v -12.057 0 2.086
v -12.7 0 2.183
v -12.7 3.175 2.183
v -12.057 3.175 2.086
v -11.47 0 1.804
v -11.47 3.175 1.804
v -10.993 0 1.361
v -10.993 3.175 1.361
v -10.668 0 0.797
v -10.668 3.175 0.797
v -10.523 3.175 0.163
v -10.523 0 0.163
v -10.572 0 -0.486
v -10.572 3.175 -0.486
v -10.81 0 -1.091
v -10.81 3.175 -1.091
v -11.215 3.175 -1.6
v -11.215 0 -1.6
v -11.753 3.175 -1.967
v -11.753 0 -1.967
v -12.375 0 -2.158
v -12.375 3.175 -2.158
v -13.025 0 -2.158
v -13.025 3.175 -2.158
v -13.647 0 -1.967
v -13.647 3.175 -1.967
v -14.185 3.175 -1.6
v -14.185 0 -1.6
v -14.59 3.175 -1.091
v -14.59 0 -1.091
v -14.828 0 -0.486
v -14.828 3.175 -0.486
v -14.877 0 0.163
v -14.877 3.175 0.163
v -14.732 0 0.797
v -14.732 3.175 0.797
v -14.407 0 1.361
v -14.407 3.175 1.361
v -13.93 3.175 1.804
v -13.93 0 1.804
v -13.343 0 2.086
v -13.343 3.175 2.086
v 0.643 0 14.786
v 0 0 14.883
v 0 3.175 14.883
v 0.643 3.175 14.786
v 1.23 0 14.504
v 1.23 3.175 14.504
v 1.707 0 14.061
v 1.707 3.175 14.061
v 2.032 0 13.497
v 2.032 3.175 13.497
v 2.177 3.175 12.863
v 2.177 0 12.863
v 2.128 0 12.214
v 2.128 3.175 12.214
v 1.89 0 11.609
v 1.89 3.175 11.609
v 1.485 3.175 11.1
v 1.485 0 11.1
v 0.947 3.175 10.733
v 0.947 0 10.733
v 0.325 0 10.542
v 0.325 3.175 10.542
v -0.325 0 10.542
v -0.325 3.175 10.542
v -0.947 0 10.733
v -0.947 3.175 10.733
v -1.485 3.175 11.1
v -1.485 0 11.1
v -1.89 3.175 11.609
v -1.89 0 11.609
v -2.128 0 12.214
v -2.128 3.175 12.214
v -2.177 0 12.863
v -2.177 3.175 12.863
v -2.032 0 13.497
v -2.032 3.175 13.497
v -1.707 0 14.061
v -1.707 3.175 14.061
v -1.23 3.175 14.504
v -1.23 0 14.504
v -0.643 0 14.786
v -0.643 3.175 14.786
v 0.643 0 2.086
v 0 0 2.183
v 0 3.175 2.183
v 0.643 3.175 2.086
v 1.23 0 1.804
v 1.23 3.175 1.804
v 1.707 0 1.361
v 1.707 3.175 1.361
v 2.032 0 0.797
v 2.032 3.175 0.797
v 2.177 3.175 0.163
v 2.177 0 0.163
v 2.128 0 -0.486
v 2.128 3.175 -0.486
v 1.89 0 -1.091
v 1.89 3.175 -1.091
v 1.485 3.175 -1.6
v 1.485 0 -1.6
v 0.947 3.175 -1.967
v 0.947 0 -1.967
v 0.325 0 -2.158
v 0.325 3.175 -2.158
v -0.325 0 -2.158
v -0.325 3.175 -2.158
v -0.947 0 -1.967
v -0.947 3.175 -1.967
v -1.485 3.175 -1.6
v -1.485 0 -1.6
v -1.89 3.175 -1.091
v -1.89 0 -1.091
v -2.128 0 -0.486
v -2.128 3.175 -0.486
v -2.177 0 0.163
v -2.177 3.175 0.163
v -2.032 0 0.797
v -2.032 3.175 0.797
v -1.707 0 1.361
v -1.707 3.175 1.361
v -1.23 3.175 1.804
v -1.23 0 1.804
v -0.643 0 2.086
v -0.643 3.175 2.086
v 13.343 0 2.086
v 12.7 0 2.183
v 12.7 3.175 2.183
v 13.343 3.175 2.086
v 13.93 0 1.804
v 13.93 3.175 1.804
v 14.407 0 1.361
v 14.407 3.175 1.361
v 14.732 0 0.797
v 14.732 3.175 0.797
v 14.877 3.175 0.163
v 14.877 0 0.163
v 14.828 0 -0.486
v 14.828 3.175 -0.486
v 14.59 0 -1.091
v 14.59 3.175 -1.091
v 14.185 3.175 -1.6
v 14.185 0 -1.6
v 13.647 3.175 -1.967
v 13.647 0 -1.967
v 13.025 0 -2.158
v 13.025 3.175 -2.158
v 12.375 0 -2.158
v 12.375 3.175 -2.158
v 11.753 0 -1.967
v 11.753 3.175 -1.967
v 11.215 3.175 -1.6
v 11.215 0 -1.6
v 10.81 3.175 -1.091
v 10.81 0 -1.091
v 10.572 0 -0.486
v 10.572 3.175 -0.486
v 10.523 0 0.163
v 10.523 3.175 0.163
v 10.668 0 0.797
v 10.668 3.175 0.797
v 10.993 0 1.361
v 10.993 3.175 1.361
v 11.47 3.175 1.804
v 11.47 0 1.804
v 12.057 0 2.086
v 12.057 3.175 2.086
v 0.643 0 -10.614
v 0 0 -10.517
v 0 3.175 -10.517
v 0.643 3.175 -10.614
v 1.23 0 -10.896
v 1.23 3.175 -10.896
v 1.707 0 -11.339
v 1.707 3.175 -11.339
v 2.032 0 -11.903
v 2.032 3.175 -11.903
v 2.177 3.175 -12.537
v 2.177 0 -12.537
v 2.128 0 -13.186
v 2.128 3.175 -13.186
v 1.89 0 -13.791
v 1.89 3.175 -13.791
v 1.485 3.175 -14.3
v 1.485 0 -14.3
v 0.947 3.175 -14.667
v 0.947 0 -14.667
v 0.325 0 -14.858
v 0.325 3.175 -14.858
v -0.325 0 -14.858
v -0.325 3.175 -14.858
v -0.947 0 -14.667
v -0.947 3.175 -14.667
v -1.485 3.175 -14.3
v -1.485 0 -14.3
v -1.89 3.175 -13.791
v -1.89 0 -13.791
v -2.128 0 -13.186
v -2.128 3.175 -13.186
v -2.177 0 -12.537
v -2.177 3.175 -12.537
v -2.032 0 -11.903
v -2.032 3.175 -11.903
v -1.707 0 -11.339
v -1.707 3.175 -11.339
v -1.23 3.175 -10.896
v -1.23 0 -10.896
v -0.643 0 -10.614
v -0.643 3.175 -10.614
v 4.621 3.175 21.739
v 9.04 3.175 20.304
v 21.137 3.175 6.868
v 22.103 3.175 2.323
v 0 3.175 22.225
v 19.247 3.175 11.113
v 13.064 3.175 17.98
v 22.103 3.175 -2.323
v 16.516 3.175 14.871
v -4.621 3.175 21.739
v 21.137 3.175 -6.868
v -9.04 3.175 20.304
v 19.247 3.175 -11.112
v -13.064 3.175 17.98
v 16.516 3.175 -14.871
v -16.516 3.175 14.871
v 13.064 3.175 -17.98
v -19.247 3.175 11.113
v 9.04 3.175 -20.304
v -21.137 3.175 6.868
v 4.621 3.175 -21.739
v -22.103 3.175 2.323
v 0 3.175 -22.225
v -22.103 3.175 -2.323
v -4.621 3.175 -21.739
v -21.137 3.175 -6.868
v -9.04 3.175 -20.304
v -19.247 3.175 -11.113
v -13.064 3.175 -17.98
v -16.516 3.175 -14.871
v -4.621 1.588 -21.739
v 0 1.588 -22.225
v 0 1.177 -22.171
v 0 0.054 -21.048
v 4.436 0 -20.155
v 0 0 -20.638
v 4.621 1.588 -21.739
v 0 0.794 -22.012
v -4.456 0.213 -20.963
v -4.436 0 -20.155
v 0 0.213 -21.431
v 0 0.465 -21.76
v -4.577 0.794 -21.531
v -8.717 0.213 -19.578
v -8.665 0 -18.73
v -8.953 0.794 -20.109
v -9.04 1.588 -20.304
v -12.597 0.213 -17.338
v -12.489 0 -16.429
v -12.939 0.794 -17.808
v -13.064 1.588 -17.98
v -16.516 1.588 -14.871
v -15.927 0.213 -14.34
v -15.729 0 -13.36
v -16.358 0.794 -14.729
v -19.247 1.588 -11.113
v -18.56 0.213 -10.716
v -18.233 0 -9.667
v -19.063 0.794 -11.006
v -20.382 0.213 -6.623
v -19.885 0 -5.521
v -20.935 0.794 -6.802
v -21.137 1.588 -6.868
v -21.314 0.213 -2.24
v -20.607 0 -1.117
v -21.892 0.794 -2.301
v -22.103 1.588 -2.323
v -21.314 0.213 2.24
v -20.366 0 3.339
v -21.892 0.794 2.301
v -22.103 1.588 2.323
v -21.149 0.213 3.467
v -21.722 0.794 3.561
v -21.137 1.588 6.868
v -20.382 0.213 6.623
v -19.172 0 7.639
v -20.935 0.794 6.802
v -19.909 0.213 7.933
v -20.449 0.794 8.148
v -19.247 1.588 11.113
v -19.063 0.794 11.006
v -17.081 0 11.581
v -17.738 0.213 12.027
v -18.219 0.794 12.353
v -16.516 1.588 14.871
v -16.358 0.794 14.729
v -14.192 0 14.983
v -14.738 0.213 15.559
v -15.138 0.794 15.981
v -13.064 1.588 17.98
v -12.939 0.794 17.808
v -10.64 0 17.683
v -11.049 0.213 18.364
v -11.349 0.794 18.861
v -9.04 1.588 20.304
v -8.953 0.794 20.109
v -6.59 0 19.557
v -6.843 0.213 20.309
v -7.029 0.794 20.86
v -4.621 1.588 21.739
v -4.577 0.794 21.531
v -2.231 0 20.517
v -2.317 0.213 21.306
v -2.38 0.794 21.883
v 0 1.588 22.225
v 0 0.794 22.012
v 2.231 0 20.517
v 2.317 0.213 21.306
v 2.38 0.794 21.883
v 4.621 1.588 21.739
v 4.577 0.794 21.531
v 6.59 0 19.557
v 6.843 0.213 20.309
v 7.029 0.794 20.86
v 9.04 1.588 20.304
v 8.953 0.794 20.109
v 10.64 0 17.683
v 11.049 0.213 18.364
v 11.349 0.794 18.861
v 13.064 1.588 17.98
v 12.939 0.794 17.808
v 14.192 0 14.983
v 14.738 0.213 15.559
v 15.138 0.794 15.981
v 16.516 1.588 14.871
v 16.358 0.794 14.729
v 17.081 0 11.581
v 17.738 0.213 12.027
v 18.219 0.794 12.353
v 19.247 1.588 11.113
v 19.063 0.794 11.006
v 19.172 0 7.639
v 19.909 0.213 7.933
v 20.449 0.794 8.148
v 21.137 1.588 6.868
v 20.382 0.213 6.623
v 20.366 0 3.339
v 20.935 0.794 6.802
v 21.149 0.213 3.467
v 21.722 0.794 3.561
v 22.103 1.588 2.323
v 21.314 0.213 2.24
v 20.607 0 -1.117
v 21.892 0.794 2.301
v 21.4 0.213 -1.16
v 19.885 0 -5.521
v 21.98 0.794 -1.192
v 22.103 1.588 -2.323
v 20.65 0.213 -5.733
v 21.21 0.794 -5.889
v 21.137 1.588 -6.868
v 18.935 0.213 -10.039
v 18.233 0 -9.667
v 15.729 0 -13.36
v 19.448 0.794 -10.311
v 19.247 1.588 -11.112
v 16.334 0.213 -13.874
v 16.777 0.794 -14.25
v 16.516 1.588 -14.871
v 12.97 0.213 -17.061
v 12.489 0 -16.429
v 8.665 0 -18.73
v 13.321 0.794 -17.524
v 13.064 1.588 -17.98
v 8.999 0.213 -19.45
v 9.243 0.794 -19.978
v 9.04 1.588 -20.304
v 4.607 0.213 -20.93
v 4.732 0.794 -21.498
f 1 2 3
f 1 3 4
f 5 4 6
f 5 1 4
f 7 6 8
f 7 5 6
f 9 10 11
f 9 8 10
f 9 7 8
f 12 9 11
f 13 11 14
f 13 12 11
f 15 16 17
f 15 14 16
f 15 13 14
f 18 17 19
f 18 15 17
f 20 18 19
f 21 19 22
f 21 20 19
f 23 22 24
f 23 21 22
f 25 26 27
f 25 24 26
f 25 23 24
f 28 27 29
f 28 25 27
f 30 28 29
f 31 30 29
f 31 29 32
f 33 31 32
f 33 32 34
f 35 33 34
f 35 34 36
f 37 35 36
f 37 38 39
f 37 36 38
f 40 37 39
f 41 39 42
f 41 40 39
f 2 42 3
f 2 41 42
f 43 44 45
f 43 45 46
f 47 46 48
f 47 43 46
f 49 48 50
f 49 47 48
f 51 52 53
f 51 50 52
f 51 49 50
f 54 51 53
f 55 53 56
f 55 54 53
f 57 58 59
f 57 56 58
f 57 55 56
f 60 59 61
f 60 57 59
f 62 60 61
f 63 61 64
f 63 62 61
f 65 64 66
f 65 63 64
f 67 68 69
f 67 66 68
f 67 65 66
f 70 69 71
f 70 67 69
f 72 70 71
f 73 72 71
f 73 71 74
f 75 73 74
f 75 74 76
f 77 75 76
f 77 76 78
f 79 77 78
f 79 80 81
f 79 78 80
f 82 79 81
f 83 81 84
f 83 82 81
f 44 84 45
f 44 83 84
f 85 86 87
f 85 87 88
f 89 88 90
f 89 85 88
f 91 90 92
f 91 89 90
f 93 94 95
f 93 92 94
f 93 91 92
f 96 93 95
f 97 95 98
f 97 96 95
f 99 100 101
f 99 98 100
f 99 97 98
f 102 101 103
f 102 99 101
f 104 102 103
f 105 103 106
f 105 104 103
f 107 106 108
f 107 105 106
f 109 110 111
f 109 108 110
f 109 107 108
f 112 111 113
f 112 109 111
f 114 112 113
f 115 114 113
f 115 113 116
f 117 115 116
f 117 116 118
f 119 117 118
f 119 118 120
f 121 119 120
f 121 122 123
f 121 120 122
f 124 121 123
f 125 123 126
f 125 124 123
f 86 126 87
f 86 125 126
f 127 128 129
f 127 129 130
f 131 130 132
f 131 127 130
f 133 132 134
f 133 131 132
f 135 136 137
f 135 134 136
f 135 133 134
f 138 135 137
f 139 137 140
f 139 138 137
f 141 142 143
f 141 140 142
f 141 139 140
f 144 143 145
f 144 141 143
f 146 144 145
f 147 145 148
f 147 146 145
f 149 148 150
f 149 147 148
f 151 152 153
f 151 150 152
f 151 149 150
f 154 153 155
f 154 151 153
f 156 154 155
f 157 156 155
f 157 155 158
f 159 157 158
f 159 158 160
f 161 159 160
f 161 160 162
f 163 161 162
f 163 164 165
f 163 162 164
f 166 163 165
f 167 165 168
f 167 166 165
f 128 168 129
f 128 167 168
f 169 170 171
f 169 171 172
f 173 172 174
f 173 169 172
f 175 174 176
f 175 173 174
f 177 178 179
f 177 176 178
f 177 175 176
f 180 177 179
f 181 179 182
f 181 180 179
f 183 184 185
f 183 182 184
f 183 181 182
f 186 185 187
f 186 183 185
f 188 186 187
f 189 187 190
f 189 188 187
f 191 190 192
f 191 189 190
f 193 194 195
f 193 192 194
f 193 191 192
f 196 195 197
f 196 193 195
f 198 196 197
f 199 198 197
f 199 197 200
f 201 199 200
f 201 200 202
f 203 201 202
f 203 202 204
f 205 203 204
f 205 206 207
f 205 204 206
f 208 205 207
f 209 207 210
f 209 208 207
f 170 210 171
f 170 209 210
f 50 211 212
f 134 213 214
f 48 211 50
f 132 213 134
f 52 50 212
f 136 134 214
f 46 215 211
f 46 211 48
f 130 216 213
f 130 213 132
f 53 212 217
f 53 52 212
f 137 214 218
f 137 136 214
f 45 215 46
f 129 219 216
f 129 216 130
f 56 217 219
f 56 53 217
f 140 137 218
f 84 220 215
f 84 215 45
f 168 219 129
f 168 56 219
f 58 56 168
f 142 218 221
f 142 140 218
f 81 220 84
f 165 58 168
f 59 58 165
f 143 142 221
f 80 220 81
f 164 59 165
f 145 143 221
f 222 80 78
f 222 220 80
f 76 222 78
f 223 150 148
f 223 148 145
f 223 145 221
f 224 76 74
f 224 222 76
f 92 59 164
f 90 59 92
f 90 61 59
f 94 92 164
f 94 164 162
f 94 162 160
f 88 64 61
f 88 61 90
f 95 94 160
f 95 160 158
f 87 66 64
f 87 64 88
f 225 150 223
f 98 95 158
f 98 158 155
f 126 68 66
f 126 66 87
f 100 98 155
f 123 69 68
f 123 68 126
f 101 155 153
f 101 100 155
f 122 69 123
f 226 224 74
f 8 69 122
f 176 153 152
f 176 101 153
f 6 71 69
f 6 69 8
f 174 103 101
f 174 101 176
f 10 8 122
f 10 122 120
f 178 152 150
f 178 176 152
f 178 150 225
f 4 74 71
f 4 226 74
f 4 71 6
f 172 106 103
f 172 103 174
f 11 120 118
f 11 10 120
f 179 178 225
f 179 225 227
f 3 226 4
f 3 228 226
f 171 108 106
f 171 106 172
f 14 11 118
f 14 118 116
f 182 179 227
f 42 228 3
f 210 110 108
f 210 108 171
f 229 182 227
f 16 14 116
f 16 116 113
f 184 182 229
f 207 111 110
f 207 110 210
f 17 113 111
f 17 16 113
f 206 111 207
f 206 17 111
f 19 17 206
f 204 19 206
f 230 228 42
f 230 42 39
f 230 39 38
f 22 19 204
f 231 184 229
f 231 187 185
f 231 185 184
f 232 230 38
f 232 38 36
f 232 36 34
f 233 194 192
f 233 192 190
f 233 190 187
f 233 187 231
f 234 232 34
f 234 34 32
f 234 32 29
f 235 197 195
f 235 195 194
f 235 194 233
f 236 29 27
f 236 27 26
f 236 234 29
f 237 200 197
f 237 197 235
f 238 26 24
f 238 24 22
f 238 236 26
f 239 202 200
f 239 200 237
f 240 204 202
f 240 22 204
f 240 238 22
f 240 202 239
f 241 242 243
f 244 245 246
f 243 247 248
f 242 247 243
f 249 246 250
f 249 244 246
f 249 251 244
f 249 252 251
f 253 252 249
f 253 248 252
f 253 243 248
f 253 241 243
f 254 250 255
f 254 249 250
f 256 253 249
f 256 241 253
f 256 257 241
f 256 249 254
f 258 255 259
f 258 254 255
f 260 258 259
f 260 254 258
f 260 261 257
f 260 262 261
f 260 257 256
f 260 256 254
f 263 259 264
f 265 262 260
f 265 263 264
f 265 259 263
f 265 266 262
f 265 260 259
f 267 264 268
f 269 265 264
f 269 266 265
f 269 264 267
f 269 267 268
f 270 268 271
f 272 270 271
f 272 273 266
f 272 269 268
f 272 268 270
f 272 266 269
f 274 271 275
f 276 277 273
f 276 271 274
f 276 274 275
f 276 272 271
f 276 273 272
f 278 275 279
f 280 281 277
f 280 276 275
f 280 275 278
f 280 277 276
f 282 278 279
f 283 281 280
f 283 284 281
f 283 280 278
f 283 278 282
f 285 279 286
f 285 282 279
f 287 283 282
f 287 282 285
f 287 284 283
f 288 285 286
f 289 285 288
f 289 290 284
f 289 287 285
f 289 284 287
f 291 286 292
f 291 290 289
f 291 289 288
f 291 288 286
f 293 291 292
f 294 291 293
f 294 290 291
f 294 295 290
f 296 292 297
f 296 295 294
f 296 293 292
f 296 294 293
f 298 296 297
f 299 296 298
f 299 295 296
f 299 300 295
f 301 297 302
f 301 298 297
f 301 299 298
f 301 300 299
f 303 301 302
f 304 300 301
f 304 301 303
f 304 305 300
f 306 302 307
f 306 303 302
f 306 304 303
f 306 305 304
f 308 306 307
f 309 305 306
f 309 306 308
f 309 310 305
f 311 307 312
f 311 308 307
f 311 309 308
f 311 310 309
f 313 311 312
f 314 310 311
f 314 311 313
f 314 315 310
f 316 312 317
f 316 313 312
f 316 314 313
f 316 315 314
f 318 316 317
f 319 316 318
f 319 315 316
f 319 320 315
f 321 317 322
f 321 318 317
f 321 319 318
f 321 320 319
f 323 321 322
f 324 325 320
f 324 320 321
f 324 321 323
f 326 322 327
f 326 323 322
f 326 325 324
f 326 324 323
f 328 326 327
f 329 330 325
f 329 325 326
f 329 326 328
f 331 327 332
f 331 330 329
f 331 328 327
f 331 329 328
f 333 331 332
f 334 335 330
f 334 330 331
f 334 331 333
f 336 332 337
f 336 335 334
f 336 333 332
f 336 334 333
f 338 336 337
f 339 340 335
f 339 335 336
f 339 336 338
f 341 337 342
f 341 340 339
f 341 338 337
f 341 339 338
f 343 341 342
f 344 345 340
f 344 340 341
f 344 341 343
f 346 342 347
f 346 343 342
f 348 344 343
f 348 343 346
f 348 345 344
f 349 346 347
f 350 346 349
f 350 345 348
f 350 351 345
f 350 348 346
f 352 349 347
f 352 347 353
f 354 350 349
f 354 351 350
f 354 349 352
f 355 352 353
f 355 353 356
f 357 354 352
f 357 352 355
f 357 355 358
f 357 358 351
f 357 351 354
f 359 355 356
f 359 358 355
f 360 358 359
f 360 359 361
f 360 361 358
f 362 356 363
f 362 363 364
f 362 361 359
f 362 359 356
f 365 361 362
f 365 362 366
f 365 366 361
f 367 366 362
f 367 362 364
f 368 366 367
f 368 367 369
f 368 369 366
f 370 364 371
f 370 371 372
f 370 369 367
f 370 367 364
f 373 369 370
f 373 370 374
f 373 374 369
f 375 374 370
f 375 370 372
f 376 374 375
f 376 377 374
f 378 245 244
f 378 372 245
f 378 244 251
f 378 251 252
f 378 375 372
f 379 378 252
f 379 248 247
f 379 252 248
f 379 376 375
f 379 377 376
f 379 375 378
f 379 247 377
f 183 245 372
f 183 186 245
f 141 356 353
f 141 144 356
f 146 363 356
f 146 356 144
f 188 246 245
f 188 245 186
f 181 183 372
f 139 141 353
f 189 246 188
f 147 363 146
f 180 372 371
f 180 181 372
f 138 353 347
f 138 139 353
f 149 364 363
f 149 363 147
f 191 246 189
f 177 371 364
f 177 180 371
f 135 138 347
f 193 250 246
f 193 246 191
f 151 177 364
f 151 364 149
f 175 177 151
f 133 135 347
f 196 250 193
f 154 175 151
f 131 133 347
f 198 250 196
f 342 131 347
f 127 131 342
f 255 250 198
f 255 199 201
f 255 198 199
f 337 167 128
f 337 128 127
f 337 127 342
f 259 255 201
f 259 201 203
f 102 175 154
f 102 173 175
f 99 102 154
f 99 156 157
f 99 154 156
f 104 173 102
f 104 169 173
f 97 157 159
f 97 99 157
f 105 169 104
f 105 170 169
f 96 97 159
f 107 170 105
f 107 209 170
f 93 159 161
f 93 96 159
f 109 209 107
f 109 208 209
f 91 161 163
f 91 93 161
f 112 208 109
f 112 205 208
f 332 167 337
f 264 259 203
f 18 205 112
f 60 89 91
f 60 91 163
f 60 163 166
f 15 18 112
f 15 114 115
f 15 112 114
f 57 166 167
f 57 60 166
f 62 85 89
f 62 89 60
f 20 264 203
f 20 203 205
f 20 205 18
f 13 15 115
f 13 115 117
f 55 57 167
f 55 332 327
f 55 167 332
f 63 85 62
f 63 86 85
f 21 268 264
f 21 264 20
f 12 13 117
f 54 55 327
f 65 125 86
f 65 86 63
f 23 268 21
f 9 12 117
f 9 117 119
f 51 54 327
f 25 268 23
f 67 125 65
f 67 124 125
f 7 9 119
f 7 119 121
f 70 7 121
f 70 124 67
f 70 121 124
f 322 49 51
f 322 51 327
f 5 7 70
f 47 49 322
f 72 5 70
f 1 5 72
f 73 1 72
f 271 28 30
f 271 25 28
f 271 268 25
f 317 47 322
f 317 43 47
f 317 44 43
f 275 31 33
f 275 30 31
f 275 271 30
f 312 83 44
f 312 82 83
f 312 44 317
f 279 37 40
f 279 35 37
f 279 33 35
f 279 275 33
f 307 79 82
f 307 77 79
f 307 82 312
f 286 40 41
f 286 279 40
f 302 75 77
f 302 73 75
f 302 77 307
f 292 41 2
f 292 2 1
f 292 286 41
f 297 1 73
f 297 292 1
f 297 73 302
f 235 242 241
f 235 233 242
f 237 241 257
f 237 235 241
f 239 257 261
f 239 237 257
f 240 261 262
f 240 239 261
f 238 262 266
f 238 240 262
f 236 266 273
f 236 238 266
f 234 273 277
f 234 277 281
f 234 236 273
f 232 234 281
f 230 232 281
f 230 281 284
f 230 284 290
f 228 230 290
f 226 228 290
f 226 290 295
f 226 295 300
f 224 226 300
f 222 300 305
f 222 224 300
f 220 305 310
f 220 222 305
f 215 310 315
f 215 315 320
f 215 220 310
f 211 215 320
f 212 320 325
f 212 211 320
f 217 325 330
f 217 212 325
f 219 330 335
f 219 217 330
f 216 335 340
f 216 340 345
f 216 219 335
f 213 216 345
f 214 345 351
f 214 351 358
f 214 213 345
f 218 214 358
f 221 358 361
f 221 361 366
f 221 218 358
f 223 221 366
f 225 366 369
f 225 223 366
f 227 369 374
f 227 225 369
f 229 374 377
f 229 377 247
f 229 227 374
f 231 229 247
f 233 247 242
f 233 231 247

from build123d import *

# Parameters (mm, degrees)
CUT_EXTRUDE1_DEPTH      = 32.590851198
CUT_EXTRUDE1_DEPTH_BACK = 32.590851198
SKETCH2_R               = 2.1828125


with BuildPart() as part:
    # Sketch1 → Revolve1 (revolve)
    with BuildSketch(Plane.XY, mode=Mode.PRIVATE) as revolve1_sk:
        with BuildLine():
            Line((0, 0), (20.6375, 0))
            ThreePointArc((20.6375, 0), (21.760032015, 0.464967985), (22.225, 1.5875))
            Line((22.225, 1.5875), (22.225, 3.175))
            Line((22.225, 3.175), (0, 3.175))
            Line((0, 3.175), (0, 0))
        make_face()
    revolve(revolve1_sk.sketch.rotate(Axis((0, 0, 0), (0, 1, 0)), 90), axis=Axis((0, 0, 0), (0, 1, 0)))

    # Sketch2 → Cut-Extrude1 (cut, two sides: drawn at the far end of the back side and taken through both)
    with BuildSketch(Plane(origin=(0, 3.175, 0), x_dir=(1, 0, 0), z_dir=(0, 1, 0)).offset(-CUT_EXTRUDE1_DEPTH_BACK)):
        with Locations(Location((0, 0, 0), (0, 0, 270))):
            Circle(SKETCH2_R)
        with Locations(Location((12.7, 0, 0), (0, 0, 270))):
            Circle(SKETCH2_R)
        with Locations(Location((-12.7, 0, 0), (0, 0, 270))):
            Circle(SKETCH2_R)
        with Locations(Location((0, 12.7, 0), (0, 0, 270))):
            Circle(SKETCH2_R)
        with Locations(Location((0, -12.7, 0), (0, 0, 270))):
            Circle(SKETCH2_R)
    extrude(amount=CUT_EXTRUDE1_DEPTH + CUT_EXTRUDE1_DEPTH_BACK, mode=Mode.SUBTRACT)


solid = part.part
